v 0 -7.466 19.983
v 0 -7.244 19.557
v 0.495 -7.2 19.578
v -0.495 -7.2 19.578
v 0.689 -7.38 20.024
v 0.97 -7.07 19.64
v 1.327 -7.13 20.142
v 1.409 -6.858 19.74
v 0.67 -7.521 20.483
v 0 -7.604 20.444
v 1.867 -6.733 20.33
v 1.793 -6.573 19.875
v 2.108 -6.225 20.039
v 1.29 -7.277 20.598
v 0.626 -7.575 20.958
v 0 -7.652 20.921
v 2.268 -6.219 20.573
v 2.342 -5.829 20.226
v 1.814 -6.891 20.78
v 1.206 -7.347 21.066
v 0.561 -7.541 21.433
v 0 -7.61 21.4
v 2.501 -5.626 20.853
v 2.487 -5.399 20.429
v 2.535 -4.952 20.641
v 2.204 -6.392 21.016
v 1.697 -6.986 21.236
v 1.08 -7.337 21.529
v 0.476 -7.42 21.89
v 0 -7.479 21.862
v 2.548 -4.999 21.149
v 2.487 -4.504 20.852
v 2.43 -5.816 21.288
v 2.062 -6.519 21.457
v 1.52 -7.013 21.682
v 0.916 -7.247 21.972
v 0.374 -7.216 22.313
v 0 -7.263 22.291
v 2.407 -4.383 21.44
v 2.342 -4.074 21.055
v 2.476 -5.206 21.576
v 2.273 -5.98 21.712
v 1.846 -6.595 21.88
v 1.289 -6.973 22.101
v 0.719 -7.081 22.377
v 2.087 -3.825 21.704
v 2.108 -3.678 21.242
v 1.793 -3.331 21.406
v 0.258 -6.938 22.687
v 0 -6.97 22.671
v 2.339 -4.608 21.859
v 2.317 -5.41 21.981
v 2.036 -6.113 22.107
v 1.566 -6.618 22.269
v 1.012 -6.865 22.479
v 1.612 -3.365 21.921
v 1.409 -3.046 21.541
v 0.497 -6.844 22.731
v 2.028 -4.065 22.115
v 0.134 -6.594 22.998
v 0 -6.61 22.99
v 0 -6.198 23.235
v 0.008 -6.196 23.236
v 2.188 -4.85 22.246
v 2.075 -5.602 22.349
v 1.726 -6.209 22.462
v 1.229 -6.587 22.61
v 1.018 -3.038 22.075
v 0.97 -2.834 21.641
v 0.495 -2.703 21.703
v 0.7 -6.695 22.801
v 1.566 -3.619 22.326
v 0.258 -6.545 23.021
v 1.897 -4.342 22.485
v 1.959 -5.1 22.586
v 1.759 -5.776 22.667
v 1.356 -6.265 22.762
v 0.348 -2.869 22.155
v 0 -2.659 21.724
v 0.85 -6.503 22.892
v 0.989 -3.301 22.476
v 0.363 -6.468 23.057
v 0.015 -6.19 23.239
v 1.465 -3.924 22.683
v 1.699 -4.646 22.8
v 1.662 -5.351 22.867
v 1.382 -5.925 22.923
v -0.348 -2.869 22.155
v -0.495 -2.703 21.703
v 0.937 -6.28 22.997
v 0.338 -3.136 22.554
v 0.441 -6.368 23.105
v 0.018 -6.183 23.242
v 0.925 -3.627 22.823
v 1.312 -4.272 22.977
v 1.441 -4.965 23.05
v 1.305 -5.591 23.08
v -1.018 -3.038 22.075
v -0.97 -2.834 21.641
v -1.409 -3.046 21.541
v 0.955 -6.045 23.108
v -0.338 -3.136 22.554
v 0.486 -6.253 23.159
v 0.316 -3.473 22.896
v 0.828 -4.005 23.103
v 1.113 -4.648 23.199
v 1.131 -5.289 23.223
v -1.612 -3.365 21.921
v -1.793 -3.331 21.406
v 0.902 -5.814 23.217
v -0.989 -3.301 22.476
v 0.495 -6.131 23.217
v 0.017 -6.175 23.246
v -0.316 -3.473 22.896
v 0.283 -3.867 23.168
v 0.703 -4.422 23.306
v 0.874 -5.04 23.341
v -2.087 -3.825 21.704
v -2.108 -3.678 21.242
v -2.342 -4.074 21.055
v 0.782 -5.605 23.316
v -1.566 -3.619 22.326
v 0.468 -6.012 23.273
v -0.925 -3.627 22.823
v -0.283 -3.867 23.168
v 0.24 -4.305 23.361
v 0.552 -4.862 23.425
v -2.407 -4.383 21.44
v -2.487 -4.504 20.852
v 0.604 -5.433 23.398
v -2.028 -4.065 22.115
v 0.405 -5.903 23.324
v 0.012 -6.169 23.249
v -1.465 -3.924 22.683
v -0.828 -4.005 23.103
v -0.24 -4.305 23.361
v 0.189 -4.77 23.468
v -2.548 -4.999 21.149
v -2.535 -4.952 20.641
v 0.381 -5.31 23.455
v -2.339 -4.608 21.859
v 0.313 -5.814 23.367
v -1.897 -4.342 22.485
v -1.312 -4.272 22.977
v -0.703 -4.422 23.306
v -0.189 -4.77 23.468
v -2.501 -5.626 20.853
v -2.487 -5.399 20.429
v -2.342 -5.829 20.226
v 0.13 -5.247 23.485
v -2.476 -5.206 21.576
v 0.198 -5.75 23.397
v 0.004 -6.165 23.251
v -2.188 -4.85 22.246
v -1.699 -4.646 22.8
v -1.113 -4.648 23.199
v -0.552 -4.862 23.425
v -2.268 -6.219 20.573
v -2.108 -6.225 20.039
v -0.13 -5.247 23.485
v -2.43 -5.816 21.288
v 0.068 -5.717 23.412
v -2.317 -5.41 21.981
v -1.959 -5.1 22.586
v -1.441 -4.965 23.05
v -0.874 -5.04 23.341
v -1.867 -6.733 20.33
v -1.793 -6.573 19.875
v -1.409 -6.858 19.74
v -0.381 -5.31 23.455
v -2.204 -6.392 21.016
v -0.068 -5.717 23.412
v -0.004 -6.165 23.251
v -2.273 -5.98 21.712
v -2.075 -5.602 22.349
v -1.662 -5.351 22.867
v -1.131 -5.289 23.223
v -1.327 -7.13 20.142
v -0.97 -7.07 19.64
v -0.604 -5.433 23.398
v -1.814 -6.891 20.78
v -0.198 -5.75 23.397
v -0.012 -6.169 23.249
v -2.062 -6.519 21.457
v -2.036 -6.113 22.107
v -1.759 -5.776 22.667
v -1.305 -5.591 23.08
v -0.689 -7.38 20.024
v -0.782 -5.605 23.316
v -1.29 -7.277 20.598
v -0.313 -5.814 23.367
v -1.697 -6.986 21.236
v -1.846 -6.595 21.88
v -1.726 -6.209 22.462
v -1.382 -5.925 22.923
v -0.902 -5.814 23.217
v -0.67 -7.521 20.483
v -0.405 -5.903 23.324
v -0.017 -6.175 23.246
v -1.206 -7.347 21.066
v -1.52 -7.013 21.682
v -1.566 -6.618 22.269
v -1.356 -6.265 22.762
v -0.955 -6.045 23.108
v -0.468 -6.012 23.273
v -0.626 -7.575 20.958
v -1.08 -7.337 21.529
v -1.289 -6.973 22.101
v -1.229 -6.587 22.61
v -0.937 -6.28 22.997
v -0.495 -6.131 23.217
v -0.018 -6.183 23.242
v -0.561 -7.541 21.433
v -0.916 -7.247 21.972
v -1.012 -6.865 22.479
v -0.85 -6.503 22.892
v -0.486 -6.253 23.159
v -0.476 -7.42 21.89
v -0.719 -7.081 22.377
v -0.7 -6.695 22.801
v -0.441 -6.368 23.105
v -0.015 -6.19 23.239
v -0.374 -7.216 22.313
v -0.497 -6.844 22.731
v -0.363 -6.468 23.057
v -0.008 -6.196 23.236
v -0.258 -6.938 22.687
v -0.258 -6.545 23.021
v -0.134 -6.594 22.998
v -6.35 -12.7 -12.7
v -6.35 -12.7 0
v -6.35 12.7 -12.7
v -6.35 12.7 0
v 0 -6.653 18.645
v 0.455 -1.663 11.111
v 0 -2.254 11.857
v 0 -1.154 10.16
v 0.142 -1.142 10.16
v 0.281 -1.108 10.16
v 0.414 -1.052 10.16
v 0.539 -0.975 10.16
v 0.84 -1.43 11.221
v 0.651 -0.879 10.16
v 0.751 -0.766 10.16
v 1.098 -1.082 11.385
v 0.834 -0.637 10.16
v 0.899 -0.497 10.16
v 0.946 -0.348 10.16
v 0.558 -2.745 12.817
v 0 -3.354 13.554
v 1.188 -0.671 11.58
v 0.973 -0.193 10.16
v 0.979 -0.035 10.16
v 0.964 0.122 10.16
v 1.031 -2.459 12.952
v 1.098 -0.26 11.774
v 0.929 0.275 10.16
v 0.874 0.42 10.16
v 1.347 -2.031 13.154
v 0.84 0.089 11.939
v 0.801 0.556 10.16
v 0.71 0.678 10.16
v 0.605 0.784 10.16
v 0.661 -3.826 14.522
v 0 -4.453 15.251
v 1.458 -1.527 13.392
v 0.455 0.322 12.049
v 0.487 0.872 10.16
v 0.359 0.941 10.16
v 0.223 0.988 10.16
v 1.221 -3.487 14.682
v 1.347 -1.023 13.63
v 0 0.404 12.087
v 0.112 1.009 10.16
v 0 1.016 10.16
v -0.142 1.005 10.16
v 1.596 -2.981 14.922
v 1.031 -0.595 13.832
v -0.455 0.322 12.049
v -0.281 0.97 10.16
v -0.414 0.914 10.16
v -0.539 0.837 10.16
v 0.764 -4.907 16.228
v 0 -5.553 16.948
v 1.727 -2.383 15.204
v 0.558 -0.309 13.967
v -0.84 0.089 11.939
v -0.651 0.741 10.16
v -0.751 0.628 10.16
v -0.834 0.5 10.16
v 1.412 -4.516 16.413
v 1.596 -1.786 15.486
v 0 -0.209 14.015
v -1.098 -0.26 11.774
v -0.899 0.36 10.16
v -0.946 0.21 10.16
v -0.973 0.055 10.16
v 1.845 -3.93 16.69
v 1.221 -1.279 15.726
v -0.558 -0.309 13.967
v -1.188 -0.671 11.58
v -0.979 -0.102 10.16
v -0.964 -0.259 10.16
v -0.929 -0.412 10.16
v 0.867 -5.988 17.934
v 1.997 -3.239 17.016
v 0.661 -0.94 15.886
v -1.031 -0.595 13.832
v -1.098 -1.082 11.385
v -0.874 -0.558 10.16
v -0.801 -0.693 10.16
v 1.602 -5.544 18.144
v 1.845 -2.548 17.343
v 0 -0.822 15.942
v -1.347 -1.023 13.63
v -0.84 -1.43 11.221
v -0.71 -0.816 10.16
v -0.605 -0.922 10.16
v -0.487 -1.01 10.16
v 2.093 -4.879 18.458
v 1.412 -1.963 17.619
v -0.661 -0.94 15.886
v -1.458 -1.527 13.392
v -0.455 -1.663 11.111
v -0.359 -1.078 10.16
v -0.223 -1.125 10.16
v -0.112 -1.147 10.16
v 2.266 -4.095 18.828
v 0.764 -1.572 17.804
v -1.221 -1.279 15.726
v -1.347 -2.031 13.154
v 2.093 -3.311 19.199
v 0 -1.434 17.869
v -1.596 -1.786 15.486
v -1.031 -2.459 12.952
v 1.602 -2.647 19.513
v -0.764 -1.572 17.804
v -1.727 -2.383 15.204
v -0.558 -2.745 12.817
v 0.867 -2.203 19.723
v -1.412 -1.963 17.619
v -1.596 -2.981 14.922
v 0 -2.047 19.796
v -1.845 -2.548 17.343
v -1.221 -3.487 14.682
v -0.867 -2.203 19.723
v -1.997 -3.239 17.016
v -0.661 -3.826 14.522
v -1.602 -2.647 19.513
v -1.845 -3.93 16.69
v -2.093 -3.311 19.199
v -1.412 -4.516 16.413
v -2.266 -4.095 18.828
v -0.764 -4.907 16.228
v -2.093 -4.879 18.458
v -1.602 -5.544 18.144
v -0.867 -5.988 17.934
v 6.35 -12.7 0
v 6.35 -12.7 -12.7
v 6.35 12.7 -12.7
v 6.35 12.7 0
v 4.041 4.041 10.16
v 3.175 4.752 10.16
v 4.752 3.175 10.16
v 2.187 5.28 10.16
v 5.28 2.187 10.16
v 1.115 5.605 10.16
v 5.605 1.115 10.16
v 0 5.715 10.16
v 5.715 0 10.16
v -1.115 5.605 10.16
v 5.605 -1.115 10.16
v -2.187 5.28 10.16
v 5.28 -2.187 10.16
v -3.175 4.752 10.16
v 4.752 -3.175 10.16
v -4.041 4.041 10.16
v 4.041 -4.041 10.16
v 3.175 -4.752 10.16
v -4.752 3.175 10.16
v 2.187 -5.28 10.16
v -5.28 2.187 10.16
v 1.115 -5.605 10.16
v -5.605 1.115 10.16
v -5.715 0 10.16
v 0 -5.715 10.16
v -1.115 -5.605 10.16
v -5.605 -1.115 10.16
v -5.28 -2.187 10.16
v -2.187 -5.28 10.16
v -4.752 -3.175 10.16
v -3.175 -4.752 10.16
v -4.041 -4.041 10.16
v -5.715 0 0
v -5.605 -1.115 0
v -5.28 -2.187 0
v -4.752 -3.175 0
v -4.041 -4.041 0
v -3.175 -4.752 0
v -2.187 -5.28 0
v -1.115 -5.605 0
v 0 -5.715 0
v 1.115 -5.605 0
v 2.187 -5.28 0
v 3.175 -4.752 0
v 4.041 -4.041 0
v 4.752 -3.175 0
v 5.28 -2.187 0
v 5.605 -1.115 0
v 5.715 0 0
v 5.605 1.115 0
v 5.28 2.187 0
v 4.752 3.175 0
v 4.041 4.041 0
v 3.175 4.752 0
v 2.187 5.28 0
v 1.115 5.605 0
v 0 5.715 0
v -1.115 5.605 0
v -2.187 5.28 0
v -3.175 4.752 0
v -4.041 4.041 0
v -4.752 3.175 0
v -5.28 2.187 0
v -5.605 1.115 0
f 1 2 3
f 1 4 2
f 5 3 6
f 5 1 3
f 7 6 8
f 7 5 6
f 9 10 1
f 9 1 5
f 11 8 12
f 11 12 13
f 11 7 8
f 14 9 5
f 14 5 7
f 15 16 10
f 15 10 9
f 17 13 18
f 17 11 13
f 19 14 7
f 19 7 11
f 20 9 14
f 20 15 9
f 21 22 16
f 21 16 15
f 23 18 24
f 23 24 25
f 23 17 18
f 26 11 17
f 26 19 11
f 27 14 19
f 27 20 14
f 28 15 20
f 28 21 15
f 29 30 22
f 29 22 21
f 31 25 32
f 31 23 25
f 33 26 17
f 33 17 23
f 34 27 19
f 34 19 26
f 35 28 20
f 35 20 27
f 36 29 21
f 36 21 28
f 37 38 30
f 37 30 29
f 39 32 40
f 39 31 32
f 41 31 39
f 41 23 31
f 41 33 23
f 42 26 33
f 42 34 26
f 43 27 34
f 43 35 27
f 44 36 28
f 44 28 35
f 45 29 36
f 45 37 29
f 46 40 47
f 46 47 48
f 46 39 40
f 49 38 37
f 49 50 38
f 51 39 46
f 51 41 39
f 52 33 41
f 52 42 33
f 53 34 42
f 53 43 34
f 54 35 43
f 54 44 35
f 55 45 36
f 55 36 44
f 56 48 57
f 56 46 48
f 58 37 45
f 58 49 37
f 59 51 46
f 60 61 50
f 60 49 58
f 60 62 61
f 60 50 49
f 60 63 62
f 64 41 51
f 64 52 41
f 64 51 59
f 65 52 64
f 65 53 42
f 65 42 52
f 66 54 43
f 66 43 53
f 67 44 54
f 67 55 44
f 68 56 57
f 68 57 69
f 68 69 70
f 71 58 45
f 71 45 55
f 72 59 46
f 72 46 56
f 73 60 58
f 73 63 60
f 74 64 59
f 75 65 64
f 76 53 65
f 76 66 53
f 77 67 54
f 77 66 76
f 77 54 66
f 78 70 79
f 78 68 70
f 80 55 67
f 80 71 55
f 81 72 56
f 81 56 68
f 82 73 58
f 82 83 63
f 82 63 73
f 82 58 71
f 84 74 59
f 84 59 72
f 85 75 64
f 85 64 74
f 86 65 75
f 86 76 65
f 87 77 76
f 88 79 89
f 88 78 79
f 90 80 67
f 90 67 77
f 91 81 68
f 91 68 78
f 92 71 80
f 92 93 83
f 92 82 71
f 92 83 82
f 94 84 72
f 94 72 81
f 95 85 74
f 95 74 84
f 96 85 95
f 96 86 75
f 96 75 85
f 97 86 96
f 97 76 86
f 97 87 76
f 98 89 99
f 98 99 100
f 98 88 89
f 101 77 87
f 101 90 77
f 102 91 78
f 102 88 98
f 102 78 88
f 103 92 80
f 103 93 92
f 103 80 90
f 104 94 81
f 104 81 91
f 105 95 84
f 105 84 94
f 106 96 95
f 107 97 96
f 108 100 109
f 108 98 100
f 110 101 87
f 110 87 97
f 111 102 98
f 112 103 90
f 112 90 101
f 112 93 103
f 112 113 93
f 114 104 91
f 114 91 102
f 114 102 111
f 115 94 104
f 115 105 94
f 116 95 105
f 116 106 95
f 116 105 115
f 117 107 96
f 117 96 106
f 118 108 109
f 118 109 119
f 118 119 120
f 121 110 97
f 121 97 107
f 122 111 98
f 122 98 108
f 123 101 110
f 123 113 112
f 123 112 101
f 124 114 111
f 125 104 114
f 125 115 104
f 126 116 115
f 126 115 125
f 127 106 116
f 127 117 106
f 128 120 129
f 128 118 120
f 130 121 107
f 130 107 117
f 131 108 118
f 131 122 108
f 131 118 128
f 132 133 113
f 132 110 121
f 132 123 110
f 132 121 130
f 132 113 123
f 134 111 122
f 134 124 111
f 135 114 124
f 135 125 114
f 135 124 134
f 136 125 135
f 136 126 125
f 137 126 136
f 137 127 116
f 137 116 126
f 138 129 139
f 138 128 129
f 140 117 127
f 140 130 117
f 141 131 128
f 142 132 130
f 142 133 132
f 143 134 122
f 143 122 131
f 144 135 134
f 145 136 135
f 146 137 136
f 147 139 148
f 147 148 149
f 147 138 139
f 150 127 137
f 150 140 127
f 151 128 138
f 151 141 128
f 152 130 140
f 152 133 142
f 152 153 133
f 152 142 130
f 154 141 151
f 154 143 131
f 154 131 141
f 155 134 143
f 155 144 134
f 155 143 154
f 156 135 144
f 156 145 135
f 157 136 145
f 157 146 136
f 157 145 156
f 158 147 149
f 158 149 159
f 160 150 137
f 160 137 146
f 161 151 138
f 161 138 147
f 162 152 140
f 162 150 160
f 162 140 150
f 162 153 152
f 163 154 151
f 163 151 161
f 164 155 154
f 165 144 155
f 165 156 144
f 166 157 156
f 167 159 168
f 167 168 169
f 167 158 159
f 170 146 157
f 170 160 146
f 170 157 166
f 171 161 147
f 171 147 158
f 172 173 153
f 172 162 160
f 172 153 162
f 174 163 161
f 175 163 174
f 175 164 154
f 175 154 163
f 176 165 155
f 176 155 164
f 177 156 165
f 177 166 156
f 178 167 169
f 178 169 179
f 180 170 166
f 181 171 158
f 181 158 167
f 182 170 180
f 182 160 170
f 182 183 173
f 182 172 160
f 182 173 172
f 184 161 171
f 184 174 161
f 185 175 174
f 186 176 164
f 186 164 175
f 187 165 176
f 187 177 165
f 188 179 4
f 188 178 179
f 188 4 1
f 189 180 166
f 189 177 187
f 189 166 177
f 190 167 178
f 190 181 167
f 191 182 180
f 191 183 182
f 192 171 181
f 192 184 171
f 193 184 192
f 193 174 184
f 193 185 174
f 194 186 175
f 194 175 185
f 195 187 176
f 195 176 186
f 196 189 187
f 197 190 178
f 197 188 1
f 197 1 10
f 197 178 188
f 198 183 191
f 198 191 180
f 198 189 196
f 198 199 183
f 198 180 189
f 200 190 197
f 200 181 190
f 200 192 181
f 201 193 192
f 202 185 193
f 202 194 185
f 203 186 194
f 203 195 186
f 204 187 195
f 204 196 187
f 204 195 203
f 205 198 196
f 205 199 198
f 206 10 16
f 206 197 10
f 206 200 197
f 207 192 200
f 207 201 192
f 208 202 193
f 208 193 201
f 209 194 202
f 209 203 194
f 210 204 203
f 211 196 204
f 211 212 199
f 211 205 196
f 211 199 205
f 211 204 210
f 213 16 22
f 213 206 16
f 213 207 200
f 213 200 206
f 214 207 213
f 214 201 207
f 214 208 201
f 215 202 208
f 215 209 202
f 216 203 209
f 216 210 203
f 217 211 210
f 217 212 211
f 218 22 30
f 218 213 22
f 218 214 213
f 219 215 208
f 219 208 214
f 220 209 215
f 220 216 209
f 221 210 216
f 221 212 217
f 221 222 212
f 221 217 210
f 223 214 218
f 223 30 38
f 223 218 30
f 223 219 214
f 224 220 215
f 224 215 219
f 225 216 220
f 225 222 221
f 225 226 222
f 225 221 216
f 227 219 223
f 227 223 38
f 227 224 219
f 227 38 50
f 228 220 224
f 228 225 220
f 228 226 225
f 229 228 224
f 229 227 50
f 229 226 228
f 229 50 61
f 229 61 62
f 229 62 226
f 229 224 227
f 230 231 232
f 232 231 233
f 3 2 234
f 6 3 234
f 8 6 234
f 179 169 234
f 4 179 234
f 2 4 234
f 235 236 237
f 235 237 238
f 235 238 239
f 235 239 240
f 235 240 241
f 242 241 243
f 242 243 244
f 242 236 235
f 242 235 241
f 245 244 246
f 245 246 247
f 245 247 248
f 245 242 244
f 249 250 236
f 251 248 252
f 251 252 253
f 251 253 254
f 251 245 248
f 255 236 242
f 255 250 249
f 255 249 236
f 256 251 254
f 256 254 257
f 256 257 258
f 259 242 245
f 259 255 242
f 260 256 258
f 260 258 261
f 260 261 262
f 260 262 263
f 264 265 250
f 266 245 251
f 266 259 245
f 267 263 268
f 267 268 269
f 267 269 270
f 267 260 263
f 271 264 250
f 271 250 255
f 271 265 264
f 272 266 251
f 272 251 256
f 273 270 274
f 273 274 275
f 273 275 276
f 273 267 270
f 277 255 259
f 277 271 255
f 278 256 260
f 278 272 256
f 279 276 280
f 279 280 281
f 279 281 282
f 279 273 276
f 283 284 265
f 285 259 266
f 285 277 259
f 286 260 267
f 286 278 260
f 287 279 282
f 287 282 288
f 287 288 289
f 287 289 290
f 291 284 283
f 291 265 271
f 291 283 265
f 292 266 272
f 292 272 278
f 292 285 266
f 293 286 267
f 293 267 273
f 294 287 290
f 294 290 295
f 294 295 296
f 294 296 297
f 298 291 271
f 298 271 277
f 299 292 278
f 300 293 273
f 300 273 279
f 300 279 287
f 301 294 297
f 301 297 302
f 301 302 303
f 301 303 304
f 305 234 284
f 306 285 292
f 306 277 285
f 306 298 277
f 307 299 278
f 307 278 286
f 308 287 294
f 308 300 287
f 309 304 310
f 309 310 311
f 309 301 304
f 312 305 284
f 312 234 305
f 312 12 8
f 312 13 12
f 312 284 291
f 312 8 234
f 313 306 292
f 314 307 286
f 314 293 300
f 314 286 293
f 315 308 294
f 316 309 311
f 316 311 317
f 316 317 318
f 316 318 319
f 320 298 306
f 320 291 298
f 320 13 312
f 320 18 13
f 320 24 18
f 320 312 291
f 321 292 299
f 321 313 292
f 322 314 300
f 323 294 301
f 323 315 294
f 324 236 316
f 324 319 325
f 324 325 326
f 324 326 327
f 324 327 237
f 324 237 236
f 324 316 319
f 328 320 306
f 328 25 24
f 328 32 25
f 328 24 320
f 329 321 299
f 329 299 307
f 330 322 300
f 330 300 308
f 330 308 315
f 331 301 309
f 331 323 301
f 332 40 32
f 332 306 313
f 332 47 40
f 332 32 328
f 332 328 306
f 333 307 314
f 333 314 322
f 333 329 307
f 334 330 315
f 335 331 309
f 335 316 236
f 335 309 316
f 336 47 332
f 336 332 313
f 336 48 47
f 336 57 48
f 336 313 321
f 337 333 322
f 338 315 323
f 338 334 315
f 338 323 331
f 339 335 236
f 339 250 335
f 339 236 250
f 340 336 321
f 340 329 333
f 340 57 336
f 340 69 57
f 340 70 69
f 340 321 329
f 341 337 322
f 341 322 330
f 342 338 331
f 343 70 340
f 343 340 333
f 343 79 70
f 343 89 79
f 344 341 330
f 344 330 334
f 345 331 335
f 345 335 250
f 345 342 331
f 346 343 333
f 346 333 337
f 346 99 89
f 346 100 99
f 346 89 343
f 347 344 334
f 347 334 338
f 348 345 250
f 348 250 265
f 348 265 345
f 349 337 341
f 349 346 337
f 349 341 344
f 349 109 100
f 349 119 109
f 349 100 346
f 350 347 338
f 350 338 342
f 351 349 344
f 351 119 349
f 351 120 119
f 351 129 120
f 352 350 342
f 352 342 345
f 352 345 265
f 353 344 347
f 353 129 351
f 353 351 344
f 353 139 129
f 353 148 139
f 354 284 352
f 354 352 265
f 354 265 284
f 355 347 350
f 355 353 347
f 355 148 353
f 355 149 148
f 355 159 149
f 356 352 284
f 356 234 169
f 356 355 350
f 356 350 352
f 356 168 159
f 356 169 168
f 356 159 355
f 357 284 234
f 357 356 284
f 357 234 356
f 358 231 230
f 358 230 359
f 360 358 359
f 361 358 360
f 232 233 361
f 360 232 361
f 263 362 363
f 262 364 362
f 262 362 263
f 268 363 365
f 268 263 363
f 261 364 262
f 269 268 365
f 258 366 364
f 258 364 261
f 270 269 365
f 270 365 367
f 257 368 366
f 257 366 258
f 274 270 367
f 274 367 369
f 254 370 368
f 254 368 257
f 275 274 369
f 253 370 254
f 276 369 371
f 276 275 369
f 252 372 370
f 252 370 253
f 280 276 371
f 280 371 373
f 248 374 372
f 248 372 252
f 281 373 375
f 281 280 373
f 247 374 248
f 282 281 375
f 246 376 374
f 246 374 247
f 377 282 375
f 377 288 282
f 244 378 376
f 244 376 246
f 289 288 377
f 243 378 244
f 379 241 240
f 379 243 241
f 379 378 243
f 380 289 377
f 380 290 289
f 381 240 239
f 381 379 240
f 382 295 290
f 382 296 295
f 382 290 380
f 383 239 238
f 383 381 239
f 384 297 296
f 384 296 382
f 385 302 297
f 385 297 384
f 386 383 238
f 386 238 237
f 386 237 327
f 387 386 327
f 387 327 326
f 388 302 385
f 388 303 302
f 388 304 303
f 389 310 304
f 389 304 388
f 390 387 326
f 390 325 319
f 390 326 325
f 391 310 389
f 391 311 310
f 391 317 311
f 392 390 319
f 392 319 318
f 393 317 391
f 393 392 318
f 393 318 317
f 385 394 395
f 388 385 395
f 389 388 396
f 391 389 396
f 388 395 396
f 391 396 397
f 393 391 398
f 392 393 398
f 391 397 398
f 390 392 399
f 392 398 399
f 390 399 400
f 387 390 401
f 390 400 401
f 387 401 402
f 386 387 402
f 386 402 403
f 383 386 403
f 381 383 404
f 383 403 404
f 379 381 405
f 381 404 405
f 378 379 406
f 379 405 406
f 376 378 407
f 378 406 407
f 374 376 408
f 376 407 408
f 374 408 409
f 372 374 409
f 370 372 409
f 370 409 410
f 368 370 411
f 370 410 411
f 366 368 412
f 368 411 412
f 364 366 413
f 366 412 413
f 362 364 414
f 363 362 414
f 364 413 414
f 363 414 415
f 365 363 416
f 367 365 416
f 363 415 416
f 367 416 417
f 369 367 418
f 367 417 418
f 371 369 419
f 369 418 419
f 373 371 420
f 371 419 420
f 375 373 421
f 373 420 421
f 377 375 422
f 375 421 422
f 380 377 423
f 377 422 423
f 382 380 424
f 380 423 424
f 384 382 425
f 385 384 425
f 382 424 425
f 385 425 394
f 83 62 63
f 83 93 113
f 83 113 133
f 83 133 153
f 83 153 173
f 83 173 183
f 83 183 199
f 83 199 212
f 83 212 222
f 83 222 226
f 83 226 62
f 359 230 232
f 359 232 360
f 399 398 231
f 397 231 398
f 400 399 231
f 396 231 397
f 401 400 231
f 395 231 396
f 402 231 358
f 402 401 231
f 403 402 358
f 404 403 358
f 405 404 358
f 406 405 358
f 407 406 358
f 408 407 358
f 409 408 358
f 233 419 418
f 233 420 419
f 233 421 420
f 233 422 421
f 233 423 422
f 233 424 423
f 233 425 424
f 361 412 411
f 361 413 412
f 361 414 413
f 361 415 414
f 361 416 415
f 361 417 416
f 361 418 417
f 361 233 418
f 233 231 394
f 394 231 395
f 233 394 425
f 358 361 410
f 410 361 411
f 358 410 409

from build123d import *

# Parameters (mm, degrees)
SKETCH1_W      = 12.7
SKETCH1_H      = 25.4
EXTRUDE1_DEPTH = 12.7
SKETCH1_3_R    = 5.715
EXTRUDE2_DEPTH = 10.16
FILLET1_R      = 2.54


with BuildPart() as part:
    # Sketch1 → Extrude1 (new body)
    with BuildSketch(Plane.XY):
        Rectangle(SKETCH1_W, SKETCH1_H)
    extrude(amount=-EXTRUDE1_DEPTH)

    # Sketch1<3> → Extrude2 (add)
    with BuildSketch(Plane.XY):
        Circle(SKETCH1_3_R)
    extrude(amount=EXTRUDE2_DEPTH)

    # Sketch2 → Revolve1 (revolve)
    with BuildSketch(Plane(origin=(0, 0, 0), x_dir=(0, 0, -1), z_dir=(1, 0, 0))):
        Polygon((-10.16, 1.016088838), (-24.491517392, -3.538898285), (-23.243143226, -6.1812071), (-10.16, 0), align=None)
    revolve(axis=Axis((0, 0, 10.16), (0, -0.4271789944976144, 0.9041670789516765)))

    # Fillet1
    fillet1_edges = [part.edges().sort_by_distance(p)[0] for p in [
        (0, -8.823515916, 21.99476906),
    ]]
    fillet(fillet1_edges, radius=FILLET1_R)


solid = part.part
